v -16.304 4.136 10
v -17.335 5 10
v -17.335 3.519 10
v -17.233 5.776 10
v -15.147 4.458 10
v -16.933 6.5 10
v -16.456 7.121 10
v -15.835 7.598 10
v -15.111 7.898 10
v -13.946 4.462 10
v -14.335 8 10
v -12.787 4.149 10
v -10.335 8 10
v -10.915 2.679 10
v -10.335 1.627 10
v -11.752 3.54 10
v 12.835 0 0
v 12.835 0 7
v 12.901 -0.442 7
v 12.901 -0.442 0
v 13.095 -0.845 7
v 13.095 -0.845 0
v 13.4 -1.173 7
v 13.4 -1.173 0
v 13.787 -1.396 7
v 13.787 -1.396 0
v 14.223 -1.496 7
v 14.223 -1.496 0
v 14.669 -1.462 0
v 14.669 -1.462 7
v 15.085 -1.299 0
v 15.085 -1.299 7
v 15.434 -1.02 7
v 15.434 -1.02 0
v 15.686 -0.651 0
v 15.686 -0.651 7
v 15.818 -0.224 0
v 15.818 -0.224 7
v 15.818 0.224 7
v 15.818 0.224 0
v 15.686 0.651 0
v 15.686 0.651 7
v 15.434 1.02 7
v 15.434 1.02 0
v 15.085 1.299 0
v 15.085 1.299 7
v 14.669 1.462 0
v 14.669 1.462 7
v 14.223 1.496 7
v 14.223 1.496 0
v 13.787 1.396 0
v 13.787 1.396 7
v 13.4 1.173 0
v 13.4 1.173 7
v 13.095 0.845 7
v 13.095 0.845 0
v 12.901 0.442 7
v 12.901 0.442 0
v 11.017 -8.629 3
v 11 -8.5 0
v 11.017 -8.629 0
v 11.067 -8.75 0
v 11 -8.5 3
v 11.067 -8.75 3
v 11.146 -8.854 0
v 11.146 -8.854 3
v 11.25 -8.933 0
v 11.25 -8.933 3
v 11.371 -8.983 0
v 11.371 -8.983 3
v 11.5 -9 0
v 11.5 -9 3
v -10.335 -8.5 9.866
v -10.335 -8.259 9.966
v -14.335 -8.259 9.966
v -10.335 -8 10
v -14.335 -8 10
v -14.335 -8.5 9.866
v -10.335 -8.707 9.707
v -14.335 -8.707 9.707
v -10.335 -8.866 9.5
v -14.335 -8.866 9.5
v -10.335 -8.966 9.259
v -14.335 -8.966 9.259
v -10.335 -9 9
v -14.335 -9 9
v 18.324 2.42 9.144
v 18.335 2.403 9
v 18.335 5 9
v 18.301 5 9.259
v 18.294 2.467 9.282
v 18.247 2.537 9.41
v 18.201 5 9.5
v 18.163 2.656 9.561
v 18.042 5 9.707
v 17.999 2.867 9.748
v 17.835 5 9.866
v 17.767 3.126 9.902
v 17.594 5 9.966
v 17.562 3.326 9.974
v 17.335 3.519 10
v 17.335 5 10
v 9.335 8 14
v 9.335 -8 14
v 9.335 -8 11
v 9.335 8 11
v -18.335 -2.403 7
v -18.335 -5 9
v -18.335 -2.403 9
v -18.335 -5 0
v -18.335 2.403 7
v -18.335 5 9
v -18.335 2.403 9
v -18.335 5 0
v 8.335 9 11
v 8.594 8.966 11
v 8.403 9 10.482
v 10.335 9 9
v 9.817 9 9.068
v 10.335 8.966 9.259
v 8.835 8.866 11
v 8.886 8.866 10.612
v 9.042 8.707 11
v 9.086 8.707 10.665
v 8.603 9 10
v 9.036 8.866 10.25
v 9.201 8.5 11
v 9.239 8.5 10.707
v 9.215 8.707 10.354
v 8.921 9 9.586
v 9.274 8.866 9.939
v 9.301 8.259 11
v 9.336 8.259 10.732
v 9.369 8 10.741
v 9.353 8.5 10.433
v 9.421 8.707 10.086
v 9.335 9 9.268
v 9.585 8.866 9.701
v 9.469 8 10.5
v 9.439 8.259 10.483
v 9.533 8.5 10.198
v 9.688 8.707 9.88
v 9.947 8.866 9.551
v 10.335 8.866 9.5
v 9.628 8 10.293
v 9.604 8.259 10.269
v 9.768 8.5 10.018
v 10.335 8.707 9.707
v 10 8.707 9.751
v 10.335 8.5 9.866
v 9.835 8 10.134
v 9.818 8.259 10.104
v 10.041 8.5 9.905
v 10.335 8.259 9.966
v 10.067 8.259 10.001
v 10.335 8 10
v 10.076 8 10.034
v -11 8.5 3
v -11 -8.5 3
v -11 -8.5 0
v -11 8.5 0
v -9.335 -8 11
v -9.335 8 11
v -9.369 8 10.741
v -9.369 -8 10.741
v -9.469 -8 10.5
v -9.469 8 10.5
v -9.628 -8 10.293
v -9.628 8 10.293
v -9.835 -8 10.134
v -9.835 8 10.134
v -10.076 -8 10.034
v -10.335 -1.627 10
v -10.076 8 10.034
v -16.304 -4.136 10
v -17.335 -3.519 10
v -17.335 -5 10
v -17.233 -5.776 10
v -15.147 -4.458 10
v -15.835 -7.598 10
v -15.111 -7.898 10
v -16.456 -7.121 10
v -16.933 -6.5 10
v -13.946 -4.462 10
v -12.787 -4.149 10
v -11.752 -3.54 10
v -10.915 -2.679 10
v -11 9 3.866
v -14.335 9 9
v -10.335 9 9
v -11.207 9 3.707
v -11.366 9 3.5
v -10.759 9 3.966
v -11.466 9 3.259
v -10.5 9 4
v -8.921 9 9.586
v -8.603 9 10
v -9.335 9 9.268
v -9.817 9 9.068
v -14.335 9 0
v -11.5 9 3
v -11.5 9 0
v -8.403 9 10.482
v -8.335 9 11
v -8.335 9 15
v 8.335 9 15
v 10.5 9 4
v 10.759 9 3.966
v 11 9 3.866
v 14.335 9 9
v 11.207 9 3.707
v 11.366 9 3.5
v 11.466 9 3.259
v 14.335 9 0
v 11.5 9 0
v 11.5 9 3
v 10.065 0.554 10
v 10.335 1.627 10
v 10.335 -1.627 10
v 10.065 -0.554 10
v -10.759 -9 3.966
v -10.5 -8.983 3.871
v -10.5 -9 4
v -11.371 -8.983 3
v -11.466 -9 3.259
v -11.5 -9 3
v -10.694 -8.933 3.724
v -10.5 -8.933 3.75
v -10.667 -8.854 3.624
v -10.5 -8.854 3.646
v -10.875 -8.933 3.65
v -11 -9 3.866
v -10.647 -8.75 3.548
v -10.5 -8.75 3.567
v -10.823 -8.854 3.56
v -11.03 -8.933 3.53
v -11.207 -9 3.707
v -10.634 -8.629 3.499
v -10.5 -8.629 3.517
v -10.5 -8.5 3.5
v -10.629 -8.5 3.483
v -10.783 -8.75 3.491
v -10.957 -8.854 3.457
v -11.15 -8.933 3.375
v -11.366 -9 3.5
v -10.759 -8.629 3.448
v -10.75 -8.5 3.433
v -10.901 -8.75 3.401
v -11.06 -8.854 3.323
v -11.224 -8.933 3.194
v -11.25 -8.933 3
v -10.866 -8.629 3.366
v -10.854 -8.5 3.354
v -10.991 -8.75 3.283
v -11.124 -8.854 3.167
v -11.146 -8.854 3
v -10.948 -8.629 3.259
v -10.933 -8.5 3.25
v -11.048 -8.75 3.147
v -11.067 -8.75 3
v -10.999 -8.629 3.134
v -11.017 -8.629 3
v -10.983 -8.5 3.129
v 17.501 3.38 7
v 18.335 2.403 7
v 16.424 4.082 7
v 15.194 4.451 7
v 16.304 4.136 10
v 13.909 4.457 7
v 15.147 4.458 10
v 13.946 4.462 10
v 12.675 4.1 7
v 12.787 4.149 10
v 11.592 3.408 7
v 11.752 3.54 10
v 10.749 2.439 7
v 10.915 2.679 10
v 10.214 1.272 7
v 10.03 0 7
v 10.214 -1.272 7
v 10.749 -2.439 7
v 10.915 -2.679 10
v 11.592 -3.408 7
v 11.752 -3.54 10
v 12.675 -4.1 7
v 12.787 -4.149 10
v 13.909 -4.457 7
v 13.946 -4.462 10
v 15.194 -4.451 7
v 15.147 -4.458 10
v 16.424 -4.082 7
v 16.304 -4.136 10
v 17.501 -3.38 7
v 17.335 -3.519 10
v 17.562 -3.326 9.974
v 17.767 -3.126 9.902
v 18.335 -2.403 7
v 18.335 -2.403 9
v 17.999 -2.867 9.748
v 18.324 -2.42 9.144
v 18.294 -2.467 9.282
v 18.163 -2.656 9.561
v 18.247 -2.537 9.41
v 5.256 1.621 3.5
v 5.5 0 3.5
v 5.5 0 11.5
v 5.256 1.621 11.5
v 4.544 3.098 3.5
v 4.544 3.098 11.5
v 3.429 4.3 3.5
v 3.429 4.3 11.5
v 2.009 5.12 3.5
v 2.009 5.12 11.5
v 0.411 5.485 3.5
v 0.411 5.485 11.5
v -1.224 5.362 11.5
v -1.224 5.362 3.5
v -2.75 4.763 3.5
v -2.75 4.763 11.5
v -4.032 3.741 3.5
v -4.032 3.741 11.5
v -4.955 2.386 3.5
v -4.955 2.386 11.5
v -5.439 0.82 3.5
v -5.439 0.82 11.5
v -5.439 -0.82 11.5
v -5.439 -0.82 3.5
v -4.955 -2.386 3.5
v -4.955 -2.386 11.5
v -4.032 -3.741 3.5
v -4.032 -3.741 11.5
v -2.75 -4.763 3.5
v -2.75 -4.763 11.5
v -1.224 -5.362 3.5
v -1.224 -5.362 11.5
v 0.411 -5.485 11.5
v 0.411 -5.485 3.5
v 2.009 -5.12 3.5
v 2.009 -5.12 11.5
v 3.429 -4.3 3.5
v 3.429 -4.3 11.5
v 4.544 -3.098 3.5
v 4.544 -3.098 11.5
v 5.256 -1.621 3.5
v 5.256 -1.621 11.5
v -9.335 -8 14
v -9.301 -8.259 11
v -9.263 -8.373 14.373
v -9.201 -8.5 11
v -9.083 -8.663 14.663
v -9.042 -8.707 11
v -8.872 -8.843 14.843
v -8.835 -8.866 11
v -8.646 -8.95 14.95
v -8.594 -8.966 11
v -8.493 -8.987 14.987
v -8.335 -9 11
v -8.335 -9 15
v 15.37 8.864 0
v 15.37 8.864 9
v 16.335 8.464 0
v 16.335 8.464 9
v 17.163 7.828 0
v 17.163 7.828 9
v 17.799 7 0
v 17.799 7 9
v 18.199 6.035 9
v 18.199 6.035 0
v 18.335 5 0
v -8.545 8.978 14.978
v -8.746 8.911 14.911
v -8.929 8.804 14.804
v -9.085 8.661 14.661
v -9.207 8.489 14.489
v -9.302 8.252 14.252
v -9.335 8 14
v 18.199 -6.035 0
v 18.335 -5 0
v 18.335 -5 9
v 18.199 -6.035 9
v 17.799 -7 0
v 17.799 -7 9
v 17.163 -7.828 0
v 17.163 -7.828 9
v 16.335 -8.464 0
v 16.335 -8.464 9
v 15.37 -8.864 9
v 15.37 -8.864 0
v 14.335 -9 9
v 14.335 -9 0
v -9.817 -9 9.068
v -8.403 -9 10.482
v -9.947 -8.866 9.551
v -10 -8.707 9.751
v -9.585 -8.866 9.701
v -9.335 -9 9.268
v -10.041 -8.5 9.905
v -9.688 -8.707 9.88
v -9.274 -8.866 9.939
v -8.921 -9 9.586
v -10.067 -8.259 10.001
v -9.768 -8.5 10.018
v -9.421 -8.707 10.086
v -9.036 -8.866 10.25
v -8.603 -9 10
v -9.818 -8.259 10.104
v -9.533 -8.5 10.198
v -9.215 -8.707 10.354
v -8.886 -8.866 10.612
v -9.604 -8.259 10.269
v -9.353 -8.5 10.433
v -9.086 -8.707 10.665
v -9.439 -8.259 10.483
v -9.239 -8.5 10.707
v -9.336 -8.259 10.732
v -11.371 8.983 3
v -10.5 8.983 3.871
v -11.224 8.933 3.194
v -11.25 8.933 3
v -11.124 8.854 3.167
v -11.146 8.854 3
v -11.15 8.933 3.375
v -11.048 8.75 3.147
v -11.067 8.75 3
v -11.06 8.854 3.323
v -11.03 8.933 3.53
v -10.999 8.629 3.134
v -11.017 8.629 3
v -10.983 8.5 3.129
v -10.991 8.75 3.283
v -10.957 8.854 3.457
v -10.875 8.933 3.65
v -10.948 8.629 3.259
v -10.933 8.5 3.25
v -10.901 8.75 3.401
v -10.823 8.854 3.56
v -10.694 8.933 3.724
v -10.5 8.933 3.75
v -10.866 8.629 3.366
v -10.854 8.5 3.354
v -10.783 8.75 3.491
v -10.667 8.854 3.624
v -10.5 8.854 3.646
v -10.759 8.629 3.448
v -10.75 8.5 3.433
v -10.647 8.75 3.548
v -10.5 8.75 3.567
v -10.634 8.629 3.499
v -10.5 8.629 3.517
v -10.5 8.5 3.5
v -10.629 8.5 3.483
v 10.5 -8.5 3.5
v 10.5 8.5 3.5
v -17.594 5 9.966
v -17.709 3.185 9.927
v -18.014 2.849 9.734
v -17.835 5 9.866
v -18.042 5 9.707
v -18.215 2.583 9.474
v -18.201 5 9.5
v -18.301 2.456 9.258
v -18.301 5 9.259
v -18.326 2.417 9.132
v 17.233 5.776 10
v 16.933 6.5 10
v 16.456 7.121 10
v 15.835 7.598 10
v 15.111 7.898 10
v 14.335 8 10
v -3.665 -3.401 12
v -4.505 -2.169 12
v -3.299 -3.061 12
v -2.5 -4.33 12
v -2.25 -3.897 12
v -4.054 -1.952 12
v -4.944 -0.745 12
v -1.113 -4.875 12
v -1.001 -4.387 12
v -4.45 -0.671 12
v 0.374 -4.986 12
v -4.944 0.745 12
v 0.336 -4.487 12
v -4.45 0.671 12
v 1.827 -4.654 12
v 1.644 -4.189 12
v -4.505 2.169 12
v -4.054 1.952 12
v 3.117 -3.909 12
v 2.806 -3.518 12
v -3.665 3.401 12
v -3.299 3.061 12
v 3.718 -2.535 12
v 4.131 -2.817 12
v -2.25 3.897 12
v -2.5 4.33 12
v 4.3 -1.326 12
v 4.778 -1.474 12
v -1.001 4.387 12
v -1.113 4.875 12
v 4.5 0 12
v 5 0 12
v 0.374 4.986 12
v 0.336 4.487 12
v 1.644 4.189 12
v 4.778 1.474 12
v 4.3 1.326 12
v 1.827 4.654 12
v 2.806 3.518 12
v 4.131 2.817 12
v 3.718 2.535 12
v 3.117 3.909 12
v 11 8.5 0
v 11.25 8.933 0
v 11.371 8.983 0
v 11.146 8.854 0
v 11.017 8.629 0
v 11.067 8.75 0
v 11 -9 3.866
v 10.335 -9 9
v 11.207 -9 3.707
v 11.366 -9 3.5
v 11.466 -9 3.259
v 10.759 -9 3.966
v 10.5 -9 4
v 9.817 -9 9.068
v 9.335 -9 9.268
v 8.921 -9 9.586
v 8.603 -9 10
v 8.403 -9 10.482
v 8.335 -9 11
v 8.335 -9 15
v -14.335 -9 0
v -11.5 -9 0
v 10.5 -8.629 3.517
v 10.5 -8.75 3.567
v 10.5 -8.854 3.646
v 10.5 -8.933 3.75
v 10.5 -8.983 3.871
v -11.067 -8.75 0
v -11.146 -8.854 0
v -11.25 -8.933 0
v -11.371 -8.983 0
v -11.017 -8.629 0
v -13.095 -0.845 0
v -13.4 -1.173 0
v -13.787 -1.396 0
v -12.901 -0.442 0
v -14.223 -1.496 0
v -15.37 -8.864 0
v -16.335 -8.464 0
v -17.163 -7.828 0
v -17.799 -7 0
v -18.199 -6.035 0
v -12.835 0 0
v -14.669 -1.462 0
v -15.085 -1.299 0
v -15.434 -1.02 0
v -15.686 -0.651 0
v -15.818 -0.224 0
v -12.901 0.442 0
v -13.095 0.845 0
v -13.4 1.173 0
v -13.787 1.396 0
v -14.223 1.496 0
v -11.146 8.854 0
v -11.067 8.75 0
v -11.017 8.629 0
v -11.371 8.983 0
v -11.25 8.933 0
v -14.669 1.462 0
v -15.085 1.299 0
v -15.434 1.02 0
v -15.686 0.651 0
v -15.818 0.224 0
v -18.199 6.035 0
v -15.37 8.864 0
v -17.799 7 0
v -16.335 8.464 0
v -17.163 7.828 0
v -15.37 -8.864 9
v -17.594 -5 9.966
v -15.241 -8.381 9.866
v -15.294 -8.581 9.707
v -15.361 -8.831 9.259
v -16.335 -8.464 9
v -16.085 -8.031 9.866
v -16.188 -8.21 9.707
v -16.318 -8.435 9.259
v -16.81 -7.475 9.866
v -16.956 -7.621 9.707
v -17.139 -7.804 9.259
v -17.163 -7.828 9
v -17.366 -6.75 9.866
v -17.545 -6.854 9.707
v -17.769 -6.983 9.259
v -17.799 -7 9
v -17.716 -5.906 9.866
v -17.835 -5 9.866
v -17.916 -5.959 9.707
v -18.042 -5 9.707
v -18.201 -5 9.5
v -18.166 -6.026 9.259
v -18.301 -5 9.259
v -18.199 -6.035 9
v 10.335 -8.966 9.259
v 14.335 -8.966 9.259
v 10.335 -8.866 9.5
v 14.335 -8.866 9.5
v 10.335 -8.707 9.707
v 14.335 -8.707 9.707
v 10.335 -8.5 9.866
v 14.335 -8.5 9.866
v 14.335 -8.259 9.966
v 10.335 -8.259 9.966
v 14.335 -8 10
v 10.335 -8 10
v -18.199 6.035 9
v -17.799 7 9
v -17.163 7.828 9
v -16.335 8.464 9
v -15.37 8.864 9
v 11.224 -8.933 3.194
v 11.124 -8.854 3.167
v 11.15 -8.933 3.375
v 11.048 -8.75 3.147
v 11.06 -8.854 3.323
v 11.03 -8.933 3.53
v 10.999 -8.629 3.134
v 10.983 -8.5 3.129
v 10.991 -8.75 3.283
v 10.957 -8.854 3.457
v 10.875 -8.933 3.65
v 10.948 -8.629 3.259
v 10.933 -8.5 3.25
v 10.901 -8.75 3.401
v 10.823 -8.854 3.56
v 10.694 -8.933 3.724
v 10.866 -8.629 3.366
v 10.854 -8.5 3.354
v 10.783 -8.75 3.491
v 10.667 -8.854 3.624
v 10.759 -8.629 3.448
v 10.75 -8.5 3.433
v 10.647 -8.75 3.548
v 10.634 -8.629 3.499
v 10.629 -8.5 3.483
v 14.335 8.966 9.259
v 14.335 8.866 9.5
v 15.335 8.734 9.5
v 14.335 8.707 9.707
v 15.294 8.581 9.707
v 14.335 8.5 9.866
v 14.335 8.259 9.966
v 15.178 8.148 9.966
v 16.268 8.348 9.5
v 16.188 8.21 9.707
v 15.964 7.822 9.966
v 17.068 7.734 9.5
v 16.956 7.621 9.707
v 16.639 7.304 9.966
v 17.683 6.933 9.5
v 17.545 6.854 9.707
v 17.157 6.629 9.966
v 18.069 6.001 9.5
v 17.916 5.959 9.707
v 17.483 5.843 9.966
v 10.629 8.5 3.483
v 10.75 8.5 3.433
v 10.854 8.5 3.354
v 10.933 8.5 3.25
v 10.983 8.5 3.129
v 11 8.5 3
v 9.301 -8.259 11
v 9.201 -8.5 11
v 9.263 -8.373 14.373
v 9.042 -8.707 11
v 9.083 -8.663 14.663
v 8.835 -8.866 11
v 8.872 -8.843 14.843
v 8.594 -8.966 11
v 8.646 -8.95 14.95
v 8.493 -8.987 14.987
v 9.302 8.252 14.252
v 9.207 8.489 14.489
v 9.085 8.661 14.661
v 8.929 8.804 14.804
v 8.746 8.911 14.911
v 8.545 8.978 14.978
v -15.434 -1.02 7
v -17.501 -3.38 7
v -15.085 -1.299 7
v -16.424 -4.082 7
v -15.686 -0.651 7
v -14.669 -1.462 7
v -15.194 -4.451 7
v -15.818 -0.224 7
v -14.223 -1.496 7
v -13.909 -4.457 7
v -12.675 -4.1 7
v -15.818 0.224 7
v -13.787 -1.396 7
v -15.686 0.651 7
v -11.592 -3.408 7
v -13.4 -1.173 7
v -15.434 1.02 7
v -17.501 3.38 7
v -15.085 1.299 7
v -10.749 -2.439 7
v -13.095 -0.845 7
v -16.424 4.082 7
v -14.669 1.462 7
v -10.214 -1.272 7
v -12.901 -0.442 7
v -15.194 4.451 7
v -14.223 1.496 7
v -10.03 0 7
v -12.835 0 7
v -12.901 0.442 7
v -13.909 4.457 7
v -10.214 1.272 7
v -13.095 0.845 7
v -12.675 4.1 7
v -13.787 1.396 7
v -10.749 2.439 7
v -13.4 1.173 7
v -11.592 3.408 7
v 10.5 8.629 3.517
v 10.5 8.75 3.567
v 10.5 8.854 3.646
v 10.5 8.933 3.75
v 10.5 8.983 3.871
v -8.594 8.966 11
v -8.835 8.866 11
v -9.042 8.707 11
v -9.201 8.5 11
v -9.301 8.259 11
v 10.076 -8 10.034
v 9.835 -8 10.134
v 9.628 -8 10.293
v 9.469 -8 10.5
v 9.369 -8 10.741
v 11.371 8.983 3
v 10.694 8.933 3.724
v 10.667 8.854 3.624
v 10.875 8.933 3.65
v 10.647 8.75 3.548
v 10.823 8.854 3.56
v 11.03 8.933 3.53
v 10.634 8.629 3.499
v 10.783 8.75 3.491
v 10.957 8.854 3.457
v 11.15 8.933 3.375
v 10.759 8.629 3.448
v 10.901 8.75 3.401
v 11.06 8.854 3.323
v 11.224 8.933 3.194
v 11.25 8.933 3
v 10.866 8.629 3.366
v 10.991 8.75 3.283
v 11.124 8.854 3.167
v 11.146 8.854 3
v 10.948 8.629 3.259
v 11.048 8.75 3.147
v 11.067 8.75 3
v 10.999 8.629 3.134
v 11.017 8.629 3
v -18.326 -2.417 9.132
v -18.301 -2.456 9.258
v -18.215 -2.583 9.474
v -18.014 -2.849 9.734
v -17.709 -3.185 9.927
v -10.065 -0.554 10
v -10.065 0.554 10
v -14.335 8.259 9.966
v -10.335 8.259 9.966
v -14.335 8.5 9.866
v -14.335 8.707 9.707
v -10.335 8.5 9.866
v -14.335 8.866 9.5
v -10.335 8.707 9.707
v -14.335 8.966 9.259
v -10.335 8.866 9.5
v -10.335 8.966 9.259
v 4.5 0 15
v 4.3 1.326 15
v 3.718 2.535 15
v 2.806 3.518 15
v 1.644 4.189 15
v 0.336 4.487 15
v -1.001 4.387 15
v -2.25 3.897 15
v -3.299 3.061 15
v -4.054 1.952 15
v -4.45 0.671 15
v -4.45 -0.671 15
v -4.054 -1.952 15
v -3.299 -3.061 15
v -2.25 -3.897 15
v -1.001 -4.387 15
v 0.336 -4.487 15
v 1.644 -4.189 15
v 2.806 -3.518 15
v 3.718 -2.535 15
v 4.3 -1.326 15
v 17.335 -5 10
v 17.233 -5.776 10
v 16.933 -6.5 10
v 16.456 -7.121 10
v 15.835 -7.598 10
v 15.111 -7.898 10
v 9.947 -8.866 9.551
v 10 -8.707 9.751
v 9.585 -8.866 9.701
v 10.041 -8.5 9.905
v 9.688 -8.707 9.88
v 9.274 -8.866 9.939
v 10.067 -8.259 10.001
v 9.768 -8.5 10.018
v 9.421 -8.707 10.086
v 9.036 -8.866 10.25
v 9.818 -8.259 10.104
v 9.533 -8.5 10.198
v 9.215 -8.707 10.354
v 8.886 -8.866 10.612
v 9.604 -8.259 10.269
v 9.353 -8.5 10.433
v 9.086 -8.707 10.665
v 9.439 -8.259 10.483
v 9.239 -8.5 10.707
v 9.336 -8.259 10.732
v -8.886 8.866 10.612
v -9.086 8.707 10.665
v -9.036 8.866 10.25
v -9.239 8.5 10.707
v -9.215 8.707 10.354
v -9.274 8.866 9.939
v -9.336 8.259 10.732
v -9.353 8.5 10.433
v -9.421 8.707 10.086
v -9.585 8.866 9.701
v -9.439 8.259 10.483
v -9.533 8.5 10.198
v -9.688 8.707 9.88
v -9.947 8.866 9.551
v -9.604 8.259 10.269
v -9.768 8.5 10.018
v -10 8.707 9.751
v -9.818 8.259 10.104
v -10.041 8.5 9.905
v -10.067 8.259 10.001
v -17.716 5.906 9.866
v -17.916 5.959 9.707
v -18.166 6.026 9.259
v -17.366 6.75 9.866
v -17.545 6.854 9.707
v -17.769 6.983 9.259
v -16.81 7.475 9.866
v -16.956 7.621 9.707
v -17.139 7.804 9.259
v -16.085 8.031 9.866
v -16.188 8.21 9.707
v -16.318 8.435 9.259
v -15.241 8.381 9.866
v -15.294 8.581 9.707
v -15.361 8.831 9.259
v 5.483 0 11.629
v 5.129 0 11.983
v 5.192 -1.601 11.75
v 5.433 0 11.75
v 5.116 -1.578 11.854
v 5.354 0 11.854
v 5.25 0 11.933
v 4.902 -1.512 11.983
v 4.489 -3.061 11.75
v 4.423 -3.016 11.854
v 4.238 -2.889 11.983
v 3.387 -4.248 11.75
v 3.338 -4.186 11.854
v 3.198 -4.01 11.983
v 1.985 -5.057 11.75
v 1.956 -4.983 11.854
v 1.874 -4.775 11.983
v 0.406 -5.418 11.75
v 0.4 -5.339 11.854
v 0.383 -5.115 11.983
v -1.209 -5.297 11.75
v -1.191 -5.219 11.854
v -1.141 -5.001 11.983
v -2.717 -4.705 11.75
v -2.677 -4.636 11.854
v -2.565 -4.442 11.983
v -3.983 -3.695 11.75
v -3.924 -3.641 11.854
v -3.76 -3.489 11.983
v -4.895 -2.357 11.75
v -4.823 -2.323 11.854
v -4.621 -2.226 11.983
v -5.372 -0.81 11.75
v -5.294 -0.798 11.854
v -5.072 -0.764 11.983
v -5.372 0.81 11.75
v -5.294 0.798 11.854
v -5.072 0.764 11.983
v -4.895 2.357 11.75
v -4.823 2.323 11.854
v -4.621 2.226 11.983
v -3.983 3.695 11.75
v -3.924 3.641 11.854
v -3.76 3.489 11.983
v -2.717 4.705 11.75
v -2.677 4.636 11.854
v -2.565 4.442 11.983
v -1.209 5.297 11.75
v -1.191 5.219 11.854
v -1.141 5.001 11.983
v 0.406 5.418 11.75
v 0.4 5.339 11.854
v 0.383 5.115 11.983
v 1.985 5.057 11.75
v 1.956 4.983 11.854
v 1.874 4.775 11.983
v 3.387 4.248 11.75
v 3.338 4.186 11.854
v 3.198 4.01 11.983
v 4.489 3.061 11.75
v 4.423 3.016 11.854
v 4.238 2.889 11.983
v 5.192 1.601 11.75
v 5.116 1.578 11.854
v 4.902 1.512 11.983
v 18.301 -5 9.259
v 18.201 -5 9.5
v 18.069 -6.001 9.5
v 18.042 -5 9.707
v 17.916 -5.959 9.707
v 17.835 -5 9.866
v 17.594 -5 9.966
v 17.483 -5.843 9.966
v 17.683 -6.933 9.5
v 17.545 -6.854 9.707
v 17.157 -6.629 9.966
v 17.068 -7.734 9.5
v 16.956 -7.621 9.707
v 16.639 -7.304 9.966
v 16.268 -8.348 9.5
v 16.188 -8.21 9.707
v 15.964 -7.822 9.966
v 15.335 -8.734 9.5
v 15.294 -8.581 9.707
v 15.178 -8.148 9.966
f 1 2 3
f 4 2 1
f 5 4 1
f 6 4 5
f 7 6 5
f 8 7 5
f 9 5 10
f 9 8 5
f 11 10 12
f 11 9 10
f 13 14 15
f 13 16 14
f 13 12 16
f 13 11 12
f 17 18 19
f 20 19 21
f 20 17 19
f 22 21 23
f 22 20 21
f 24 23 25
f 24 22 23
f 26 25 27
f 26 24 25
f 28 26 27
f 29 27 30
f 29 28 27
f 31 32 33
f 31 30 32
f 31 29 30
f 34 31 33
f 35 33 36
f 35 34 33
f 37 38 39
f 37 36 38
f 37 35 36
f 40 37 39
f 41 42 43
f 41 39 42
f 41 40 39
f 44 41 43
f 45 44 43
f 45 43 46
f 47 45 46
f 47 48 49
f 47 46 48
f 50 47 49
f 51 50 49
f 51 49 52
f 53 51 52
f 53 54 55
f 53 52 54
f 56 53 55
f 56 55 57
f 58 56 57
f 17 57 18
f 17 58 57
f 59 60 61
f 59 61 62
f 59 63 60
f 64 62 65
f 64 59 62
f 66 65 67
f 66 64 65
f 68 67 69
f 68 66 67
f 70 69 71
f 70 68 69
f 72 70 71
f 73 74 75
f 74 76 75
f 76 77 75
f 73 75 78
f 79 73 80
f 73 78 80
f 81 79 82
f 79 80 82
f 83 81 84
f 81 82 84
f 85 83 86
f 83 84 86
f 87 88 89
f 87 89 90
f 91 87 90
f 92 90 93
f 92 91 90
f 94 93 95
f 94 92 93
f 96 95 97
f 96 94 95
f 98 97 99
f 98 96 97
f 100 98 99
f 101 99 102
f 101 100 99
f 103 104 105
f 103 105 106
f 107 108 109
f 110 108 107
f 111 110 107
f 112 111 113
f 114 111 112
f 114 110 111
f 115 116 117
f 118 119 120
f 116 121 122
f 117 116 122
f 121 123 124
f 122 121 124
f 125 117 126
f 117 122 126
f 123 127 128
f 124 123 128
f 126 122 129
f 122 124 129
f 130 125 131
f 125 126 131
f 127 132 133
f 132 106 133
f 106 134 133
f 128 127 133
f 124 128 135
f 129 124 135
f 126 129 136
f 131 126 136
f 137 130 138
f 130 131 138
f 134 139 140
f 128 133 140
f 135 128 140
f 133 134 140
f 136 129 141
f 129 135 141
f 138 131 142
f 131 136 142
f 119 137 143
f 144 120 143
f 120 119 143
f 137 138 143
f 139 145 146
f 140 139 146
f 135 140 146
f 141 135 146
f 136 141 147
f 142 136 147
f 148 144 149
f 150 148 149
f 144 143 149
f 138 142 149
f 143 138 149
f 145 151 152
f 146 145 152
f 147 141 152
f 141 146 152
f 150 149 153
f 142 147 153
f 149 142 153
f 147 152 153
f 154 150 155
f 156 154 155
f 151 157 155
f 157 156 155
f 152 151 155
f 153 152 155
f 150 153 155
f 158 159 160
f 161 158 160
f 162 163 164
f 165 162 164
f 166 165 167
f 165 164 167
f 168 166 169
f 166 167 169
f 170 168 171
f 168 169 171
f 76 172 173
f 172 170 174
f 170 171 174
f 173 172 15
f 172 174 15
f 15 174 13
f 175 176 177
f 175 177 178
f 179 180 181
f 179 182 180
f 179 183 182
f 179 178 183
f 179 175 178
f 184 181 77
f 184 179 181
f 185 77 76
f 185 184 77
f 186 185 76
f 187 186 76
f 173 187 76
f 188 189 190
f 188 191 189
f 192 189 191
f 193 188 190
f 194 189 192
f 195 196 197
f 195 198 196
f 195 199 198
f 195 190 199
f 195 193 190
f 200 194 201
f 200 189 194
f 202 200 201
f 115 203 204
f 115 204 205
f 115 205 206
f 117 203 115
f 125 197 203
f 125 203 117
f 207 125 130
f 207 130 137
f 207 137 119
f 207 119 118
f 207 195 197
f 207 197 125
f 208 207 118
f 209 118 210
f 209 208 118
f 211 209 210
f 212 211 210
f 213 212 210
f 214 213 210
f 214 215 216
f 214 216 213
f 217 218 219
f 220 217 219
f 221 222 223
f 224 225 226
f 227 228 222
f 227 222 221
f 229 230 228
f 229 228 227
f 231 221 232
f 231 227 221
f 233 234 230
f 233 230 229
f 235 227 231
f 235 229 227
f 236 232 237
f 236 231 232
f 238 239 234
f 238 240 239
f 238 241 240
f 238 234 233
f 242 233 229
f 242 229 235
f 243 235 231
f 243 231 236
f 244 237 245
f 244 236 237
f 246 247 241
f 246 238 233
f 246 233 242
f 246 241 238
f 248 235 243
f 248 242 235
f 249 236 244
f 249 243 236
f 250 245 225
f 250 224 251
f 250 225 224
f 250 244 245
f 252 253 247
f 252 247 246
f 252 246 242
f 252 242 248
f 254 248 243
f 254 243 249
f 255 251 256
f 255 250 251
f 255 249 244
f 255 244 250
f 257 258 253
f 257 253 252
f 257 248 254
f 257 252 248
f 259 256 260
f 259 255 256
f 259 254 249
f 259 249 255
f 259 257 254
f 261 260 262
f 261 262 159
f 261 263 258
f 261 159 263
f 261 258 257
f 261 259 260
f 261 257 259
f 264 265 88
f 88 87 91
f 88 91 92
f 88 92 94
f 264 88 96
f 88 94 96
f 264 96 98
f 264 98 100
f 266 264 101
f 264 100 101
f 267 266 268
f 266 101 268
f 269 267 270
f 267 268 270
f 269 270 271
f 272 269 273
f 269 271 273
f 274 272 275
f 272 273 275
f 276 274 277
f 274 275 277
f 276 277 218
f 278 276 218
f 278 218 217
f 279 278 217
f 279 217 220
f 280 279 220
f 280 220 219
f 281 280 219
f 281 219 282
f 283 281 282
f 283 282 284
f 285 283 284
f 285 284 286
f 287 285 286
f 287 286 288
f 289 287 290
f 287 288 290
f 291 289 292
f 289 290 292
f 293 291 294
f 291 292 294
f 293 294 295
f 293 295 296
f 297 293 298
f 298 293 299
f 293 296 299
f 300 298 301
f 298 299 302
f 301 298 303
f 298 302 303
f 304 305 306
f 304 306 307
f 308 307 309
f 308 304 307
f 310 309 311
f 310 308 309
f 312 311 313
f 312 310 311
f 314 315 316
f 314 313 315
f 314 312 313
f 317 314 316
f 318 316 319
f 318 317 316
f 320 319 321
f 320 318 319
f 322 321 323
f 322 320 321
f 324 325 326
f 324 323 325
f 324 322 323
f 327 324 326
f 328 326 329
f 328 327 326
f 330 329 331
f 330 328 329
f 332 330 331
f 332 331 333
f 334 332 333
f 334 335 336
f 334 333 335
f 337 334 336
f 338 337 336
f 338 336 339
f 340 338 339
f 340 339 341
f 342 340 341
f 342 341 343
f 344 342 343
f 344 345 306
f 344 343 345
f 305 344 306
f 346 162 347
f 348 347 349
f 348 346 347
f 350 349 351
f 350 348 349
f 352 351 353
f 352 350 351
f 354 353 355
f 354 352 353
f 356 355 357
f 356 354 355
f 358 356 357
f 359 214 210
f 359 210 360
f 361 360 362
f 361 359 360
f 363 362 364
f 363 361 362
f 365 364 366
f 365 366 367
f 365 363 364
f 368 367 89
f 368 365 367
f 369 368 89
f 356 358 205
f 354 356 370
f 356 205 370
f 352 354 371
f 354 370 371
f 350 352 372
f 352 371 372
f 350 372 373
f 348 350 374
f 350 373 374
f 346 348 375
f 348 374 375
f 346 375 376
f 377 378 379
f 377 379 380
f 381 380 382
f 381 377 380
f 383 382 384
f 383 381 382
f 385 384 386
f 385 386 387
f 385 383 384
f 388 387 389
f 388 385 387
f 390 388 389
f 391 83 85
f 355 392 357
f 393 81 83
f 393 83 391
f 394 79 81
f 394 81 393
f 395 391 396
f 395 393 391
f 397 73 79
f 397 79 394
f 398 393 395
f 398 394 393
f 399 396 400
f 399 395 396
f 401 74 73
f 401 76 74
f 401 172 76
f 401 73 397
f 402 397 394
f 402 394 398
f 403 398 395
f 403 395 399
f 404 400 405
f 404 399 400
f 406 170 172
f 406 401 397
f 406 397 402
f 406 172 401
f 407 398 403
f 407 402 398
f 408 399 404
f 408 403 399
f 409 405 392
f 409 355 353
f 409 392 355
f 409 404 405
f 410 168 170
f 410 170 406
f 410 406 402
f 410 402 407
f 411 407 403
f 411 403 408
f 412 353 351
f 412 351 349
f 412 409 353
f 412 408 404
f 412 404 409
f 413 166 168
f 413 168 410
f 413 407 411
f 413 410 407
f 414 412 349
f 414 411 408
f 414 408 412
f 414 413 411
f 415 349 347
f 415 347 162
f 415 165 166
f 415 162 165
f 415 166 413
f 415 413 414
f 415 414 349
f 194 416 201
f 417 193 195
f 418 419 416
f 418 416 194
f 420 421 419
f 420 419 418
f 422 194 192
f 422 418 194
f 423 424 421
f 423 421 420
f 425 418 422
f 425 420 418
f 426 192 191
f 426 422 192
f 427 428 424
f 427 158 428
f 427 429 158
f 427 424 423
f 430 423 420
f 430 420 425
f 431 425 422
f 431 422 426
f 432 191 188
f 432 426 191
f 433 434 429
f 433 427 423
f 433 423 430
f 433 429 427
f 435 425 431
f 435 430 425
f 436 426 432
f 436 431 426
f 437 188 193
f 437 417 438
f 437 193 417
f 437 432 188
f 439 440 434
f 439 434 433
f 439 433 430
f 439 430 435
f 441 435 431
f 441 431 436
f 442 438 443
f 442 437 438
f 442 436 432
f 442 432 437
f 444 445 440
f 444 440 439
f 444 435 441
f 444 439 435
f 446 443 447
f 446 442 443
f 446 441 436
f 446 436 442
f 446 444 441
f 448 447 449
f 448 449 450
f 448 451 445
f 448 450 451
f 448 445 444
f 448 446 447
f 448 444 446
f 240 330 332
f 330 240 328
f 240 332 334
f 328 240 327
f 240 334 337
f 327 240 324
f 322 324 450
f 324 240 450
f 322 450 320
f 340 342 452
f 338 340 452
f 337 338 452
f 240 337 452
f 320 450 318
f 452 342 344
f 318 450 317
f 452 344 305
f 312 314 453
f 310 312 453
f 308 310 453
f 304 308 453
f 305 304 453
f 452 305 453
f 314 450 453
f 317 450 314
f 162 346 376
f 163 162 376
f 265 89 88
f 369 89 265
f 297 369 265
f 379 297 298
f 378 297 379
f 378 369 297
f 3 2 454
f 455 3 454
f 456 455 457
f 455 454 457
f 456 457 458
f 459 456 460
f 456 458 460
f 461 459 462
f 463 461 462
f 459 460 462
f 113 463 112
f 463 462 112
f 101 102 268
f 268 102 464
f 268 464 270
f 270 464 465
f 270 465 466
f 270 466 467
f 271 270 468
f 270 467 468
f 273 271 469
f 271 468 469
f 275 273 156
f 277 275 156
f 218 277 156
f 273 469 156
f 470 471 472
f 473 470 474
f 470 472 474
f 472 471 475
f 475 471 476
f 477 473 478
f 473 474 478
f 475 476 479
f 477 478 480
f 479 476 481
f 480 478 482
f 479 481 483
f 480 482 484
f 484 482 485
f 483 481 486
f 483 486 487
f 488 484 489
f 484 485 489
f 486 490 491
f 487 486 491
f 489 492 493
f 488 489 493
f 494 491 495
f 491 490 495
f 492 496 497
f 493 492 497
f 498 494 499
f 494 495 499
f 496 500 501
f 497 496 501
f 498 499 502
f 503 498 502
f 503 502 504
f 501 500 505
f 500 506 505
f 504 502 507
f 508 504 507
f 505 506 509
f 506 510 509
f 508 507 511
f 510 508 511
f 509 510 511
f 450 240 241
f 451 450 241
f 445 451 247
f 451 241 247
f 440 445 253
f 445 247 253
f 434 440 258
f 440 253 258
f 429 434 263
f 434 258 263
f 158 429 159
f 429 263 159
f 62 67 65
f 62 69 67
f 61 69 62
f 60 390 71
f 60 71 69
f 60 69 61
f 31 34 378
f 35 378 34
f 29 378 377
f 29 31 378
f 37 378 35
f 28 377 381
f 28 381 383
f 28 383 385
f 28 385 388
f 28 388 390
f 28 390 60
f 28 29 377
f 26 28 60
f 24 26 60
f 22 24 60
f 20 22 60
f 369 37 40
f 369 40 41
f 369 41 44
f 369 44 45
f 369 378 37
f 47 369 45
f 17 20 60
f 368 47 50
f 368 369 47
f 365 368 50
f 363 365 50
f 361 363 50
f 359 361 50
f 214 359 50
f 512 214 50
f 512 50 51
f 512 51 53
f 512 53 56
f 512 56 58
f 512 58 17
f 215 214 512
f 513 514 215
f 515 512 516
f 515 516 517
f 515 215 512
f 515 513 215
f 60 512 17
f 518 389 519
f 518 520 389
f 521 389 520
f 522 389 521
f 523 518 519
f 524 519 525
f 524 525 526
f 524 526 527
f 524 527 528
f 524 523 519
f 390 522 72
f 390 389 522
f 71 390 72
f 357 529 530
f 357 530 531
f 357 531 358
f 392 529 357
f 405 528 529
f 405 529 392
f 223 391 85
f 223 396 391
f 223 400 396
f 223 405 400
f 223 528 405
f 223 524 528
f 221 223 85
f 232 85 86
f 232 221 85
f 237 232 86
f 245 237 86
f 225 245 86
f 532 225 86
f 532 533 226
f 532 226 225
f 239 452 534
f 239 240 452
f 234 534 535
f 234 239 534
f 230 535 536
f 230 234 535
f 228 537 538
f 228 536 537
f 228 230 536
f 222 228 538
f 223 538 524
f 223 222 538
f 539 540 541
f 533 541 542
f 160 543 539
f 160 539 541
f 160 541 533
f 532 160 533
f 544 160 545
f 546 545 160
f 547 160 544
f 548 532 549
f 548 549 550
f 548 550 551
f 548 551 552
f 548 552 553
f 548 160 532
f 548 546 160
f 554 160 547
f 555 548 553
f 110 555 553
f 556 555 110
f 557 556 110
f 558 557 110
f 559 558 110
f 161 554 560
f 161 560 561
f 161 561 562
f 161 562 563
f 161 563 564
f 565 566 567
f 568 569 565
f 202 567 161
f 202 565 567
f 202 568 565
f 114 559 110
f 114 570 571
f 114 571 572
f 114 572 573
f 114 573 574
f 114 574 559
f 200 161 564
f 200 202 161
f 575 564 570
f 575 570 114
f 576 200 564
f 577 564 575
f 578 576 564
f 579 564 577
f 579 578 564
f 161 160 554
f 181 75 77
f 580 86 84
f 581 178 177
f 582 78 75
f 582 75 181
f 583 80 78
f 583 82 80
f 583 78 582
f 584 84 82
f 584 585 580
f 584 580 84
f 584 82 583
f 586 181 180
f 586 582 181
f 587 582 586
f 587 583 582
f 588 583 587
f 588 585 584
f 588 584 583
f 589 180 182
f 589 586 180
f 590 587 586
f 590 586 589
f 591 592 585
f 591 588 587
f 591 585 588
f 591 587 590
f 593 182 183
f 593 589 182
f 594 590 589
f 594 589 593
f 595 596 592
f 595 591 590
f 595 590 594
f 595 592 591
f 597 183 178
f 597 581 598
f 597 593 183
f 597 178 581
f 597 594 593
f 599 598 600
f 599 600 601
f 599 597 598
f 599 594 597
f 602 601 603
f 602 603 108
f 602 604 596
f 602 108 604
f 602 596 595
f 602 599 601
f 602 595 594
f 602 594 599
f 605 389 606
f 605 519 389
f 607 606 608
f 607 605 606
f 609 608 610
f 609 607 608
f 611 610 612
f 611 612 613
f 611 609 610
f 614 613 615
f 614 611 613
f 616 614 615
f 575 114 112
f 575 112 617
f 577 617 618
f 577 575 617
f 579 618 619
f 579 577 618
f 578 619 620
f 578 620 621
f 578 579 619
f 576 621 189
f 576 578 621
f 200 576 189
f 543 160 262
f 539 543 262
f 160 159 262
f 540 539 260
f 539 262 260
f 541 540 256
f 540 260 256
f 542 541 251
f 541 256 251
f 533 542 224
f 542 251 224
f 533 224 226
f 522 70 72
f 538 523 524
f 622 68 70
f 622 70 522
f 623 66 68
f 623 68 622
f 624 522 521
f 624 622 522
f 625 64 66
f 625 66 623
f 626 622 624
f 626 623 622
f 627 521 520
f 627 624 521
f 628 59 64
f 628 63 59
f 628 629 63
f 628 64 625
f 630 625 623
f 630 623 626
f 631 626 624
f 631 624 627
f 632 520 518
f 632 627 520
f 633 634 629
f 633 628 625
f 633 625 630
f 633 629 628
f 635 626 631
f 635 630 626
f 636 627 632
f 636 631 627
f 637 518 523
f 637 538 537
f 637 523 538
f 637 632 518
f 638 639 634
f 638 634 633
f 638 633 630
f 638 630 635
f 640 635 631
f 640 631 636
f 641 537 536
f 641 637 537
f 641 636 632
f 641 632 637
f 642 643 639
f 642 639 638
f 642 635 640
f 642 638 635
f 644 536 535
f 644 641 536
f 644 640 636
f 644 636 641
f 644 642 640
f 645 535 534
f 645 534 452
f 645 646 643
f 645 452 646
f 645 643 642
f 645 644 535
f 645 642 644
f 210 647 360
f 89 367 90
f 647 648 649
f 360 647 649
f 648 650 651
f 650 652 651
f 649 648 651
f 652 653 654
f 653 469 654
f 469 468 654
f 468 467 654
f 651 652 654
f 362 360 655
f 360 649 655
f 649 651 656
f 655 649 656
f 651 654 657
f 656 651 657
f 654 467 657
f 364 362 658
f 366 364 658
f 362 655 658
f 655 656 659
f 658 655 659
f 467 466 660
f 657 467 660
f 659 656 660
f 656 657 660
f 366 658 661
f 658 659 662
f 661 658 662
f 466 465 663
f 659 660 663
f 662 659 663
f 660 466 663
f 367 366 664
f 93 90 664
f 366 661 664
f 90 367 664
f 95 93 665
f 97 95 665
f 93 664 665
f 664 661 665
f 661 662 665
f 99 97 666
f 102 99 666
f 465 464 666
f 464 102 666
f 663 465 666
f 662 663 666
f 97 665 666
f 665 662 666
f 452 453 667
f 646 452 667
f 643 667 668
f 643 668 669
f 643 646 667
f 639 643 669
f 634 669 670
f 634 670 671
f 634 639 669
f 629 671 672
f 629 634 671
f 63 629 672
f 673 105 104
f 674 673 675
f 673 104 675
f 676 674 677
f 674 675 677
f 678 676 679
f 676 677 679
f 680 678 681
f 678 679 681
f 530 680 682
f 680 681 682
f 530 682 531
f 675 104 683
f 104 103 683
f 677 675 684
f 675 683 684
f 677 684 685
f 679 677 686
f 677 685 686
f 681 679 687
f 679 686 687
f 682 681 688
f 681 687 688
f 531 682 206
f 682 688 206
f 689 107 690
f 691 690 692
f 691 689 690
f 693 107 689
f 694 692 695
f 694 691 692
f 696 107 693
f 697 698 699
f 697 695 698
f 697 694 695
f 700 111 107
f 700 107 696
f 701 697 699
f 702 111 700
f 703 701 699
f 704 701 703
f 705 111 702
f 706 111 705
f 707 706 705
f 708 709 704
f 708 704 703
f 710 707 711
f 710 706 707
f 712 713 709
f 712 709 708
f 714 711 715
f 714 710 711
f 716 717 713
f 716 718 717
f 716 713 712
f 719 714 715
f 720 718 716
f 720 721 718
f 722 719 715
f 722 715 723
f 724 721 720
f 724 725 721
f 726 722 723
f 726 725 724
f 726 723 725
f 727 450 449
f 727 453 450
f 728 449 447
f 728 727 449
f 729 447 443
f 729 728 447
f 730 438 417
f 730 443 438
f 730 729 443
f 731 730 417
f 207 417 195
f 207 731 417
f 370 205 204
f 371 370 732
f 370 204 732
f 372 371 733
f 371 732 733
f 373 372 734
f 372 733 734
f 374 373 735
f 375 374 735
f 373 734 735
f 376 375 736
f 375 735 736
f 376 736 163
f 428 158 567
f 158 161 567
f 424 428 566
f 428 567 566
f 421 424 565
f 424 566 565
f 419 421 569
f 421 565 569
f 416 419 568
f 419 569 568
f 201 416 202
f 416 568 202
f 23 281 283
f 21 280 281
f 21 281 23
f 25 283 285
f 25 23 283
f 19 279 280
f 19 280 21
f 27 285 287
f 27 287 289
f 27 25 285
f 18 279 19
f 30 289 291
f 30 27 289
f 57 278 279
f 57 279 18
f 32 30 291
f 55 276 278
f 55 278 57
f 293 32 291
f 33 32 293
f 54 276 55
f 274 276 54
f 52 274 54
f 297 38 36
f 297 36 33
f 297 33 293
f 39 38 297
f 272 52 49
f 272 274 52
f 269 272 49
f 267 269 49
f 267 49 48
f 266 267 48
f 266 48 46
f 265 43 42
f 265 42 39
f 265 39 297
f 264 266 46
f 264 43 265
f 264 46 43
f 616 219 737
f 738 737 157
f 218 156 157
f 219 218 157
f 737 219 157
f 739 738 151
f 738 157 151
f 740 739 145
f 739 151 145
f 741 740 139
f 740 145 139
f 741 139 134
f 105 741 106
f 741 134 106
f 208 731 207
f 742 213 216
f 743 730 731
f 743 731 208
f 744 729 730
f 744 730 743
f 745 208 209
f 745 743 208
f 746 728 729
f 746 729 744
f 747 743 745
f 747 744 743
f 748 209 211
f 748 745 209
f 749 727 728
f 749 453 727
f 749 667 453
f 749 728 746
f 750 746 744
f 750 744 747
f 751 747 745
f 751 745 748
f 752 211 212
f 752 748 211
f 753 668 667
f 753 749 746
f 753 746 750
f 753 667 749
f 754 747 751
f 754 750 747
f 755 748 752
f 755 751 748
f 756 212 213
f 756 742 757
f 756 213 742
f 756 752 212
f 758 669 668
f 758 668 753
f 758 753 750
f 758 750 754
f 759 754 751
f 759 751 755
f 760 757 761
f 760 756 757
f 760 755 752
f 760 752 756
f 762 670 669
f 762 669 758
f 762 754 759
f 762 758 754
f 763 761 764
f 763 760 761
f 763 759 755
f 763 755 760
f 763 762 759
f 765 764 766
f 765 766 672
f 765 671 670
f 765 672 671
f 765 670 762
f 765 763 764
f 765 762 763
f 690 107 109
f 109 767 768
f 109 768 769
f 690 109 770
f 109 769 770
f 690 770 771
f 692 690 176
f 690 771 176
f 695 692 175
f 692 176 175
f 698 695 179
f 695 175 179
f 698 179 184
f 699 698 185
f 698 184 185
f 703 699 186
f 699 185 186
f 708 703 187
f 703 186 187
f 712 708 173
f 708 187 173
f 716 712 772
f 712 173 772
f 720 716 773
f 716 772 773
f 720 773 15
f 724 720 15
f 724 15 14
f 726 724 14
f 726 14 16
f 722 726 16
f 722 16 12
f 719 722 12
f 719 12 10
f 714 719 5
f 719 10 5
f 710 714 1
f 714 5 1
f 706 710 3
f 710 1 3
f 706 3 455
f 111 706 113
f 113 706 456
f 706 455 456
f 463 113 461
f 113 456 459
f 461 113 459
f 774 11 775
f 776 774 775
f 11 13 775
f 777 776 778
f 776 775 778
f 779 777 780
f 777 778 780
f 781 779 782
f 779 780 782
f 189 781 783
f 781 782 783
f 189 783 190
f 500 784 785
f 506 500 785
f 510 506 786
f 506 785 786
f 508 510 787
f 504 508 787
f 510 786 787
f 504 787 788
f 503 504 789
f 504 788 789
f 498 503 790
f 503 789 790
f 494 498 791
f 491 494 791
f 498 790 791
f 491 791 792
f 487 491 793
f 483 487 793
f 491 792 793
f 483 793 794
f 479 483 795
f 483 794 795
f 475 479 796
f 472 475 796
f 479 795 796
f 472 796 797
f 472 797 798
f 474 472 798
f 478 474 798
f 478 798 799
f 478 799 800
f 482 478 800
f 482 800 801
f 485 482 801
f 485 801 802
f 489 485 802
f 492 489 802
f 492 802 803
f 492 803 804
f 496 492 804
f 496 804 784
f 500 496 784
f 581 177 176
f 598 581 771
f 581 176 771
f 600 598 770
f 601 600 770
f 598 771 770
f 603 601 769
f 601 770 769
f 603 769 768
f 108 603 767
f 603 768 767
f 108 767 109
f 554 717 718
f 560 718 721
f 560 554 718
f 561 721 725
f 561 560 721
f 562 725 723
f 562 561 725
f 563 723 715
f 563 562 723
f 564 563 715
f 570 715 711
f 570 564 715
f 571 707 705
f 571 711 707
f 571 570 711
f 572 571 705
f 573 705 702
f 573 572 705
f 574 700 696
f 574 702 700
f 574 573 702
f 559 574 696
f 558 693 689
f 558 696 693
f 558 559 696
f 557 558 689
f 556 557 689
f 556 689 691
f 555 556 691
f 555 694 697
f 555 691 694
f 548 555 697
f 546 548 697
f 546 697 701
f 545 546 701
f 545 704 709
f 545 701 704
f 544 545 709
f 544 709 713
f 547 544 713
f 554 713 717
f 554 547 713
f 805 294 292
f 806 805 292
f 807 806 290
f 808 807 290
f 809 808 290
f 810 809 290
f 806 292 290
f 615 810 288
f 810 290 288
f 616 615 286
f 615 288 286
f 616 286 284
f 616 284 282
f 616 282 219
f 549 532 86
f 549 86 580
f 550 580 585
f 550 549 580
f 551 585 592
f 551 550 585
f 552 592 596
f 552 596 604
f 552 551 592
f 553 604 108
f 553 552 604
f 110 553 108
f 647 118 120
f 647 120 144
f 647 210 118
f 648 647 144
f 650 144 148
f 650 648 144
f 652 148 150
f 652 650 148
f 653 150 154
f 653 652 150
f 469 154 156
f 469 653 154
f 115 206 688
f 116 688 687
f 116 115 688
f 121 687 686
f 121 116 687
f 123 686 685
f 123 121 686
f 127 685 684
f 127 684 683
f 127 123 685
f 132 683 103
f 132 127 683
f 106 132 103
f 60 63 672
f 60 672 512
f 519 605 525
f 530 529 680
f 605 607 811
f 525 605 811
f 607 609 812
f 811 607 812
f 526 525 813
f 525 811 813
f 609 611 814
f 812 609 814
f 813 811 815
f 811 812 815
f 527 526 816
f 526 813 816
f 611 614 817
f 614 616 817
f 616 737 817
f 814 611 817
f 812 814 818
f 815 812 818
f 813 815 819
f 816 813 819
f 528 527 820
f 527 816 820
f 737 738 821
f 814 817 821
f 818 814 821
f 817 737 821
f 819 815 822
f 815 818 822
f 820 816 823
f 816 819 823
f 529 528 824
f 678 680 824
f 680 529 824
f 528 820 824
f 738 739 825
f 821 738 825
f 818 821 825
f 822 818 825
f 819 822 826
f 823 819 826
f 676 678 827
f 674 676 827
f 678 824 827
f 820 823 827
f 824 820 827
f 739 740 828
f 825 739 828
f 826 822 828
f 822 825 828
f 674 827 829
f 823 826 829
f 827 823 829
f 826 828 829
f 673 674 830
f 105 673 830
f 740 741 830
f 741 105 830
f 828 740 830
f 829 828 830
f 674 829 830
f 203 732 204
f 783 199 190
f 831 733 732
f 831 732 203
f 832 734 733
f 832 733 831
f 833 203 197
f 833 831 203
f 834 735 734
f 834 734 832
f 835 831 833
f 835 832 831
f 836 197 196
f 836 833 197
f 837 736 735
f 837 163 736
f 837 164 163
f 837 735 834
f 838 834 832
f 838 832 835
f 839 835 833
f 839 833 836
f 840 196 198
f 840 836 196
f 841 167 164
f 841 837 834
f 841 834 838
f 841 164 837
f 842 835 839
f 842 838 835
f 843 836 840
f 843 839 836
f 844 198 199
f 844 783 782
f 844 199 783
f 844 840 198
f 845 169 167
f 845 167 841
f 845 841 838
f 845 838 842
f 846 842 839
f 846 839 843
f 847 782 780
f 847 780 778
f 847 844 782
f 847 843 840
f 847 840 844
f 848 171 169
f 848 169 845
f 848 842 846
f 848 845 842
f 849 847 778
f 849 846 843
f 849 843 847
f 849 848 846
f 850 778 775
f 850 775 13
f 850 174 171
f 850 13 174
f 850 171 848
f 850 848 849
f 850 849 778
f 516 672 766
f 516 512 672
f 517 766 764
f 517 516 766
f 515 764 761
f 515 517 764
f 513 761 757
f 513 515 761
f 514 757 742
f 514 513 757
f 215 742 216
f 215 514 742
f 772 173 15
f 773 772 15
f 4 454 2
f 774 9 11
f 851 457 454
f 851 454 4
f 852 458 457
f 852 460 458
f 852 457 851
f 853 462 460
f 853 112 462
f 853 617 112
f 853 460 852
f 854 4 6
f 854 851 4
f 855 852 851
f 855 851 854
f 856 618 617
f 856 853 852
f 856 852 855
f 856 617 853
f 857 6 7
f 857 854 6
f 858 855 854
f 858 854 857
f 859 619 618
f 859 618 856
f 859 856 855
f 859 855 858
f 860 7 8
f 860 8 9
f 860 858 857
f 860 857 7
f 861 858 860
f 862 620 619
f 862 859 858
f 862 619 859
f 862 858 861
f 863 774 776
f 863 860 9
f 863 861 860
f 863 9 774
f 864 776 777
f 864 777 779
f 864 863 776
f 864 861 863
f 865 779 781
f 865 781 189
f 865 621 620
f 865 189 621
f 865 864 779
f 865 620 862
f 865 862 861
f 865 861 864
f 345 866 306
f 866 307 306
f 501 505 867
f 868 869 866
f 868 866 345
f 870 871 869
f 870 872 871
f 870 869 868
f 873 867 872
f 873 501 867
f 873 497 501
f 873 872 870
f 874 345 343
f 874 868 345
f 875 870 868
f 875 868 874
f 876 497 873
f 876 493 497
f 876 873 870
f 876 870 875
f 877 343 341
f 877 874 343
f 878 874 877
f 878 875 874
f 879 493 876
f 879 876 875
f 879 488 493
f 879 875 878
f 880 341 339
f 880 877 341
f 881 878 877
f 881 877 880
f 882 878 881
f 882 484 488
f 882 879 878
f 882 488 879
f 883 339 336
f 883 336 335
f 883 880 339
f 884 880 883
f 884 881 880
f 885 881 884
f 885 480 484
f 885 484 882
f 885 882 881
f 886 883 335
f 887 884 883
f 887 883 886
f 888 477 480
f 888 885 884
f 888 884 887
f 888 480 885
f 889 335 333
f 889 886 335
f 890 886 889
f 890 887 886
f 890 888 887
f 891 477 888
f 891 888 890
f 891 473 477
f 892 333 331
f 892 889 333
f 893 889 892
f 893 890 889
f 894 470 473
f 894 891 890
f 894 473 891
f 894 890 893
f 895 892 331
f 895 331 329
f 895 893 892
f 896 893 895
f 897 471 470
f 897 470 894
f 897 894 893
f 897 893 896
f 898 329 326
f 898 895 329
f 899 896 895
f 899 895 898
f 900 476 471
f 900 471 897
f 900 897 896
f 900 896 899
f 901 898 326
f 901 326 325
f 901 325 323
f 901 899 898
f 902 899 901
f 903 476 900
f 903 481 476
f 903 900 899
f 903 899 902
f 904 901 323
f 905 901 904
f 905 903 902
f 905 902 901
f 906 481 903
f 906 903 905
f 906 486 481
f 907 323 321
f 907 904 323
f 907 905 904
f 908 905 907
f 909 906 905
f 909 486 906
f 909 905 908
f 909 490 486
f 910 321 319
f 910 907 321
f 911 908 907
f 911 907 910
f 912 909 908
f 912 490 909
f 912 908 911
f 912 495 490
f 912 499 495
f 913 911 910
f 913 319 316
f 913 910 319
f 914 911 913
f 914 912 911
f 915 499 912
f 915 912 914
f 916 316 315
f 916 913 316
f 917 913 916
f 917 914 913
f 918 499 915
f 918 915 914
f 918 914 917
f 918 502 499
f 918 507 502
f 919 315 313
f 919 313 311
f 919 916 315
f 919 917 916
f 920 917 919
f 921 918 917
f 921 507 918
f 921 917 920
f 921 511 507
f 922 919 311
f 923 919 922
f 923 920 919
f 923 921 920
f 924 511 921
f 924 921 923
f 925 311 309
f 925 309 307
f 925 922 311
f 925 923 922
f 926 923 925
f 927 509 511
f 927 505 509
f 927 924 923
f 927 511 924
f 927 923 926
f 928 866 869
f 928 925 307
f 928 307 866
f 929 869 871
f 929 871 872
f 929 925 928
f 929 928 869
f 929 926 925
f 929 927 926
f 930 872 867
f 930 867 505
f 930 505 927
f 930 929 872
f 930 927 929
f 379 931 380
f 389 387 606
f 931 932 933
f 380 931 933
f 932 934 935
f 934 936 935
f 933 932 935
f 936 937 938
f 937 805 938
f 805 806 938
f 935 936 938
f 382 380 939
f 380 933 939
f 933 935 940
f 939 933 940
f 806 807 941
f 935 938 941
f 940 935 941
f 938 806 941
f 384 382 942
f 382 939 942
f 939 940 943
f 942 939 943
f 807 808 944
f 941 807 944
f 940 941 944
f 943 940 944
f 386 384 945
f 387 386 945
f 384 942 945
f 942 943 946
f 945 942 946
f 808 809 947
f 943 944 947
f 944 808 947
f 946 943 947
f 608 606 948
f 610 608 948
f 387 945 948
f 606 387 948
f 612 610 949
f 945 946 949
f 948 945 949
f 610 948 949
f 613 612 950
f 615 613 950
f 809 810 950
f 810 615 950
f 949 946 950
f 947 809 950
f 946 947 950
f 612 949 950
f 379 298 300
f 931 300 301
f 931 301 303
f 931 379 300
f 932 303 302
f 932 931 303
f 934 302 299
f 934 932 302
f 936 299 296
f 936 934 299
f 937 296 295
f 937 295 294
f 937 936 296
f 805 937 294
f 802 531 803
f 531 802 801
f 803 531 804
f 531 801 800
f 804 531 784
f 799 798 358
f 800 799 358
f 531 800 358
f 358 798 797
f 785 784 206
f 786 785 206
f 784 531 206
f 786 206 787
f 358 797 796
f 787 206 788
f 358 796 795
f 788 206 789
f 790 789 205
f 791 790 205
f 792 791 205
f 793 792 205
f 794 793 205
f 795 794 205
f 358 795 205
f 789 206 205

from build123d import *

# Parameters (mm, degrees)
SKETCH1_R            = 5.5
SKETCH1_R_2          = 1.5
BOSS_EXTRUDE1_DEPTH  = 15
SKETCH3_W            = 9.999397818
SKETCH3_H            = 22.225224056
CUT_EXTRUDE1_DEPTH   = 5
FILLET1_R            = 1
FILLET1_OF_MIRROR1_R = 1
SKETCH4_R            = 7.5
BOSS_EXTRUDE2_DEPTH  = 3
SKETCH5_W            = 22
SKETCH5_H            = 7
CUT_EXTRUDE2_DEPTH   = 30.75172255
SKETCH6_R            = 4.5
CUT_EXTRUDE3_DEPTH   = 26.34097462
SKETCH7_R            = 4.5
CUT_EXTRUDE8_DEPTH   = 3
FILLET3_R            = 0.5
FILLET2_R            = 0.5


with BuildPart() as part:
    # Sketch1 → Boss-Extrude1 (new body)
    with BuildSketch(Plane.XY):
        with BuildLine():
            Line((-14.334802826, 9), (14.334802826, 9))
            ThreePointArc((14.334802826, 9), (17.163229951, 7.828427125), (18.334802826, 5))
            Line((18.334802826, 5), (18.334802826, -5))
            ThreePointArc((18.334802826, -5), (17.163229951, -7.828427125), (14.334802826, -9))
            Line((14.334802826, -9), (-14.334802826, -9))
            ThreePointArc((-14.334802826, -9), (-17.163229951, -7.828427125), (-18.334802826, -5))
            Line((-18.334802826, -5), (-18.334802826, 5))
            ThreePointArc((-18.334802826, 5), (-17.163229951, 7.828427125), (-14.334802826, 9))
        make_face()
        Circle(SKETCH1_R, mode=Mode.SUBTRACT)
        with Locations((-14.334802826, 0)):
            Circle(SKETCH1_R_2, mode=Mode.SUBTRACT)
        with Locations(Location((14.334802826, 0, 0), (0, 0, 180))):
            Circle(SKETCH1_R_2, mode=Mode.SUBTRACT)
    extrude(amount=BOSS_EXTRUDE1_DEPTH)

    # Sketch3 → Cut-Extrude1 (cut)
    with BuildSketch(Plane.XY.offset(15)):
        with Locations((-14.334501735, -0.429661625)):
            Rectangle(SKETCH3_W, SKETCH3_H)
    cut_extrude1 = extrude(amount=-CUT_EXTRUDE1_DEPTH, mode=Mode.SUBTRACT)

    # Fillet1
    fillet1_edges = [part.edges().sort_by_distance(p)[0] for p in [
        (-9.334802826, -9, 12.5),
        (-9.334802826, 0, 10),
        (-9.334802826, 9, 12.5),
        (-17.163229951, 7.828427125, 10),
        (-11.834802826, 9, 10),
        (-11.834802826, -9, 10),
        (-17.163229951, -7.828427125, 10),
        (-18.334802826, 0, 10),
        (-9.334802826, 0, 15),
    ]]
    fillet(fillet1_edges, radius=FILLET1_R)

    # Mirror1: Cut-Extrude1 across plane
    add(cut_extrude1.mirror(Plane(origin=(0, 0, 0), x_dir=(0, 0, 1), z_dir=(1, 0, 0))), mode=Mode.SUBTRACT)

    # Fillet1 of Mirror1
    fillet1_of_mirror1_edges = [part.edges().sort_by_distance(p)[0] for p in [
        (9.334802826, -9, 12.5),
        (9.334802826, 0, 10),
        (9.334802826, 9, 12.5),
        (17.163229951, 7.828427125, 10),
        (11.834802826, 9, 10),
        (11.834802826, -9, 10),
        (17.163229951, -7.828427125, 10),
        (18.334802826, 0, 10),
        (9.334802826, 0, 15),
    ]]
    fillet(fillet1_of_mirror1_edges, radius=FILLET1_OF_MIRROR1_R)

    # Sketch4 → Boss-Extrude2 (add)
    with BuildSketch(Plane.XY.offset(15)):
        Circle(SKETCH4_R)
    extrude(amount=-BOSS_EXTRUDE2_DEPTH)

    # Sketch5 → Cut-Extrude2 (cut, through all)
    with BuildSketch(Plane(origin=(0, 9, 0), x_dir=(1, 0, 0), z_dir=(0, 1, 0))):
        Rectangle(SKETCH5_W, SKETCH5_H)
    extrude(amount=-CUT_EXTRUDE2_DEPTH, mode=Mode.SUBTRACT)

    # Sketch6 → Cut-Extrude3 (cut, through all)
    with BuildSketch(Plane.XY.offset(15)):
        Circle(SKETCH6_R)
    extrude(amount=-CUT_EXTRUDE3_DEPTH, mode=Mode.SUBTRACT)

    # Sketch7 → Cut-Extrude8 (cut)
    with BuildSketch(Plane.XY.offset(10)):
        with Locations((-14.530374954, 0)):
            Circle(SKETCH7_R)
        with Locations((14.530374954, 0)):
            Circle(SKETCH7_R)
    extrude(amount=-CUT_EXTRUDE8_DEPTH, mode=Mode.SUBTRACT)

    # Fillet3
    fillet3_edges = [part.edges().sort_by_distance(p)[0] for p in [
        (11, -9, 1.75),
        (0, -9, 3.5),
        (11, 0, 3.5),
        (-11, -9, 1.75),
        (-11, 0, 3.5),
        (-11, 9, 1.75),
        (0, 9, 3.5),
        (11, 9, 1.75),
    ]]
    fillet(fillet3_edges, radius=FILLET3_R)

    # Fillet2
    fillet2_edges = [part.edges().sort_by_distance(p)[0] for p in [
        (-5.5, 0, 12),
    ]]
    fillet(fillet2_edges, radius=FILLET2_R)


solid = part.part
